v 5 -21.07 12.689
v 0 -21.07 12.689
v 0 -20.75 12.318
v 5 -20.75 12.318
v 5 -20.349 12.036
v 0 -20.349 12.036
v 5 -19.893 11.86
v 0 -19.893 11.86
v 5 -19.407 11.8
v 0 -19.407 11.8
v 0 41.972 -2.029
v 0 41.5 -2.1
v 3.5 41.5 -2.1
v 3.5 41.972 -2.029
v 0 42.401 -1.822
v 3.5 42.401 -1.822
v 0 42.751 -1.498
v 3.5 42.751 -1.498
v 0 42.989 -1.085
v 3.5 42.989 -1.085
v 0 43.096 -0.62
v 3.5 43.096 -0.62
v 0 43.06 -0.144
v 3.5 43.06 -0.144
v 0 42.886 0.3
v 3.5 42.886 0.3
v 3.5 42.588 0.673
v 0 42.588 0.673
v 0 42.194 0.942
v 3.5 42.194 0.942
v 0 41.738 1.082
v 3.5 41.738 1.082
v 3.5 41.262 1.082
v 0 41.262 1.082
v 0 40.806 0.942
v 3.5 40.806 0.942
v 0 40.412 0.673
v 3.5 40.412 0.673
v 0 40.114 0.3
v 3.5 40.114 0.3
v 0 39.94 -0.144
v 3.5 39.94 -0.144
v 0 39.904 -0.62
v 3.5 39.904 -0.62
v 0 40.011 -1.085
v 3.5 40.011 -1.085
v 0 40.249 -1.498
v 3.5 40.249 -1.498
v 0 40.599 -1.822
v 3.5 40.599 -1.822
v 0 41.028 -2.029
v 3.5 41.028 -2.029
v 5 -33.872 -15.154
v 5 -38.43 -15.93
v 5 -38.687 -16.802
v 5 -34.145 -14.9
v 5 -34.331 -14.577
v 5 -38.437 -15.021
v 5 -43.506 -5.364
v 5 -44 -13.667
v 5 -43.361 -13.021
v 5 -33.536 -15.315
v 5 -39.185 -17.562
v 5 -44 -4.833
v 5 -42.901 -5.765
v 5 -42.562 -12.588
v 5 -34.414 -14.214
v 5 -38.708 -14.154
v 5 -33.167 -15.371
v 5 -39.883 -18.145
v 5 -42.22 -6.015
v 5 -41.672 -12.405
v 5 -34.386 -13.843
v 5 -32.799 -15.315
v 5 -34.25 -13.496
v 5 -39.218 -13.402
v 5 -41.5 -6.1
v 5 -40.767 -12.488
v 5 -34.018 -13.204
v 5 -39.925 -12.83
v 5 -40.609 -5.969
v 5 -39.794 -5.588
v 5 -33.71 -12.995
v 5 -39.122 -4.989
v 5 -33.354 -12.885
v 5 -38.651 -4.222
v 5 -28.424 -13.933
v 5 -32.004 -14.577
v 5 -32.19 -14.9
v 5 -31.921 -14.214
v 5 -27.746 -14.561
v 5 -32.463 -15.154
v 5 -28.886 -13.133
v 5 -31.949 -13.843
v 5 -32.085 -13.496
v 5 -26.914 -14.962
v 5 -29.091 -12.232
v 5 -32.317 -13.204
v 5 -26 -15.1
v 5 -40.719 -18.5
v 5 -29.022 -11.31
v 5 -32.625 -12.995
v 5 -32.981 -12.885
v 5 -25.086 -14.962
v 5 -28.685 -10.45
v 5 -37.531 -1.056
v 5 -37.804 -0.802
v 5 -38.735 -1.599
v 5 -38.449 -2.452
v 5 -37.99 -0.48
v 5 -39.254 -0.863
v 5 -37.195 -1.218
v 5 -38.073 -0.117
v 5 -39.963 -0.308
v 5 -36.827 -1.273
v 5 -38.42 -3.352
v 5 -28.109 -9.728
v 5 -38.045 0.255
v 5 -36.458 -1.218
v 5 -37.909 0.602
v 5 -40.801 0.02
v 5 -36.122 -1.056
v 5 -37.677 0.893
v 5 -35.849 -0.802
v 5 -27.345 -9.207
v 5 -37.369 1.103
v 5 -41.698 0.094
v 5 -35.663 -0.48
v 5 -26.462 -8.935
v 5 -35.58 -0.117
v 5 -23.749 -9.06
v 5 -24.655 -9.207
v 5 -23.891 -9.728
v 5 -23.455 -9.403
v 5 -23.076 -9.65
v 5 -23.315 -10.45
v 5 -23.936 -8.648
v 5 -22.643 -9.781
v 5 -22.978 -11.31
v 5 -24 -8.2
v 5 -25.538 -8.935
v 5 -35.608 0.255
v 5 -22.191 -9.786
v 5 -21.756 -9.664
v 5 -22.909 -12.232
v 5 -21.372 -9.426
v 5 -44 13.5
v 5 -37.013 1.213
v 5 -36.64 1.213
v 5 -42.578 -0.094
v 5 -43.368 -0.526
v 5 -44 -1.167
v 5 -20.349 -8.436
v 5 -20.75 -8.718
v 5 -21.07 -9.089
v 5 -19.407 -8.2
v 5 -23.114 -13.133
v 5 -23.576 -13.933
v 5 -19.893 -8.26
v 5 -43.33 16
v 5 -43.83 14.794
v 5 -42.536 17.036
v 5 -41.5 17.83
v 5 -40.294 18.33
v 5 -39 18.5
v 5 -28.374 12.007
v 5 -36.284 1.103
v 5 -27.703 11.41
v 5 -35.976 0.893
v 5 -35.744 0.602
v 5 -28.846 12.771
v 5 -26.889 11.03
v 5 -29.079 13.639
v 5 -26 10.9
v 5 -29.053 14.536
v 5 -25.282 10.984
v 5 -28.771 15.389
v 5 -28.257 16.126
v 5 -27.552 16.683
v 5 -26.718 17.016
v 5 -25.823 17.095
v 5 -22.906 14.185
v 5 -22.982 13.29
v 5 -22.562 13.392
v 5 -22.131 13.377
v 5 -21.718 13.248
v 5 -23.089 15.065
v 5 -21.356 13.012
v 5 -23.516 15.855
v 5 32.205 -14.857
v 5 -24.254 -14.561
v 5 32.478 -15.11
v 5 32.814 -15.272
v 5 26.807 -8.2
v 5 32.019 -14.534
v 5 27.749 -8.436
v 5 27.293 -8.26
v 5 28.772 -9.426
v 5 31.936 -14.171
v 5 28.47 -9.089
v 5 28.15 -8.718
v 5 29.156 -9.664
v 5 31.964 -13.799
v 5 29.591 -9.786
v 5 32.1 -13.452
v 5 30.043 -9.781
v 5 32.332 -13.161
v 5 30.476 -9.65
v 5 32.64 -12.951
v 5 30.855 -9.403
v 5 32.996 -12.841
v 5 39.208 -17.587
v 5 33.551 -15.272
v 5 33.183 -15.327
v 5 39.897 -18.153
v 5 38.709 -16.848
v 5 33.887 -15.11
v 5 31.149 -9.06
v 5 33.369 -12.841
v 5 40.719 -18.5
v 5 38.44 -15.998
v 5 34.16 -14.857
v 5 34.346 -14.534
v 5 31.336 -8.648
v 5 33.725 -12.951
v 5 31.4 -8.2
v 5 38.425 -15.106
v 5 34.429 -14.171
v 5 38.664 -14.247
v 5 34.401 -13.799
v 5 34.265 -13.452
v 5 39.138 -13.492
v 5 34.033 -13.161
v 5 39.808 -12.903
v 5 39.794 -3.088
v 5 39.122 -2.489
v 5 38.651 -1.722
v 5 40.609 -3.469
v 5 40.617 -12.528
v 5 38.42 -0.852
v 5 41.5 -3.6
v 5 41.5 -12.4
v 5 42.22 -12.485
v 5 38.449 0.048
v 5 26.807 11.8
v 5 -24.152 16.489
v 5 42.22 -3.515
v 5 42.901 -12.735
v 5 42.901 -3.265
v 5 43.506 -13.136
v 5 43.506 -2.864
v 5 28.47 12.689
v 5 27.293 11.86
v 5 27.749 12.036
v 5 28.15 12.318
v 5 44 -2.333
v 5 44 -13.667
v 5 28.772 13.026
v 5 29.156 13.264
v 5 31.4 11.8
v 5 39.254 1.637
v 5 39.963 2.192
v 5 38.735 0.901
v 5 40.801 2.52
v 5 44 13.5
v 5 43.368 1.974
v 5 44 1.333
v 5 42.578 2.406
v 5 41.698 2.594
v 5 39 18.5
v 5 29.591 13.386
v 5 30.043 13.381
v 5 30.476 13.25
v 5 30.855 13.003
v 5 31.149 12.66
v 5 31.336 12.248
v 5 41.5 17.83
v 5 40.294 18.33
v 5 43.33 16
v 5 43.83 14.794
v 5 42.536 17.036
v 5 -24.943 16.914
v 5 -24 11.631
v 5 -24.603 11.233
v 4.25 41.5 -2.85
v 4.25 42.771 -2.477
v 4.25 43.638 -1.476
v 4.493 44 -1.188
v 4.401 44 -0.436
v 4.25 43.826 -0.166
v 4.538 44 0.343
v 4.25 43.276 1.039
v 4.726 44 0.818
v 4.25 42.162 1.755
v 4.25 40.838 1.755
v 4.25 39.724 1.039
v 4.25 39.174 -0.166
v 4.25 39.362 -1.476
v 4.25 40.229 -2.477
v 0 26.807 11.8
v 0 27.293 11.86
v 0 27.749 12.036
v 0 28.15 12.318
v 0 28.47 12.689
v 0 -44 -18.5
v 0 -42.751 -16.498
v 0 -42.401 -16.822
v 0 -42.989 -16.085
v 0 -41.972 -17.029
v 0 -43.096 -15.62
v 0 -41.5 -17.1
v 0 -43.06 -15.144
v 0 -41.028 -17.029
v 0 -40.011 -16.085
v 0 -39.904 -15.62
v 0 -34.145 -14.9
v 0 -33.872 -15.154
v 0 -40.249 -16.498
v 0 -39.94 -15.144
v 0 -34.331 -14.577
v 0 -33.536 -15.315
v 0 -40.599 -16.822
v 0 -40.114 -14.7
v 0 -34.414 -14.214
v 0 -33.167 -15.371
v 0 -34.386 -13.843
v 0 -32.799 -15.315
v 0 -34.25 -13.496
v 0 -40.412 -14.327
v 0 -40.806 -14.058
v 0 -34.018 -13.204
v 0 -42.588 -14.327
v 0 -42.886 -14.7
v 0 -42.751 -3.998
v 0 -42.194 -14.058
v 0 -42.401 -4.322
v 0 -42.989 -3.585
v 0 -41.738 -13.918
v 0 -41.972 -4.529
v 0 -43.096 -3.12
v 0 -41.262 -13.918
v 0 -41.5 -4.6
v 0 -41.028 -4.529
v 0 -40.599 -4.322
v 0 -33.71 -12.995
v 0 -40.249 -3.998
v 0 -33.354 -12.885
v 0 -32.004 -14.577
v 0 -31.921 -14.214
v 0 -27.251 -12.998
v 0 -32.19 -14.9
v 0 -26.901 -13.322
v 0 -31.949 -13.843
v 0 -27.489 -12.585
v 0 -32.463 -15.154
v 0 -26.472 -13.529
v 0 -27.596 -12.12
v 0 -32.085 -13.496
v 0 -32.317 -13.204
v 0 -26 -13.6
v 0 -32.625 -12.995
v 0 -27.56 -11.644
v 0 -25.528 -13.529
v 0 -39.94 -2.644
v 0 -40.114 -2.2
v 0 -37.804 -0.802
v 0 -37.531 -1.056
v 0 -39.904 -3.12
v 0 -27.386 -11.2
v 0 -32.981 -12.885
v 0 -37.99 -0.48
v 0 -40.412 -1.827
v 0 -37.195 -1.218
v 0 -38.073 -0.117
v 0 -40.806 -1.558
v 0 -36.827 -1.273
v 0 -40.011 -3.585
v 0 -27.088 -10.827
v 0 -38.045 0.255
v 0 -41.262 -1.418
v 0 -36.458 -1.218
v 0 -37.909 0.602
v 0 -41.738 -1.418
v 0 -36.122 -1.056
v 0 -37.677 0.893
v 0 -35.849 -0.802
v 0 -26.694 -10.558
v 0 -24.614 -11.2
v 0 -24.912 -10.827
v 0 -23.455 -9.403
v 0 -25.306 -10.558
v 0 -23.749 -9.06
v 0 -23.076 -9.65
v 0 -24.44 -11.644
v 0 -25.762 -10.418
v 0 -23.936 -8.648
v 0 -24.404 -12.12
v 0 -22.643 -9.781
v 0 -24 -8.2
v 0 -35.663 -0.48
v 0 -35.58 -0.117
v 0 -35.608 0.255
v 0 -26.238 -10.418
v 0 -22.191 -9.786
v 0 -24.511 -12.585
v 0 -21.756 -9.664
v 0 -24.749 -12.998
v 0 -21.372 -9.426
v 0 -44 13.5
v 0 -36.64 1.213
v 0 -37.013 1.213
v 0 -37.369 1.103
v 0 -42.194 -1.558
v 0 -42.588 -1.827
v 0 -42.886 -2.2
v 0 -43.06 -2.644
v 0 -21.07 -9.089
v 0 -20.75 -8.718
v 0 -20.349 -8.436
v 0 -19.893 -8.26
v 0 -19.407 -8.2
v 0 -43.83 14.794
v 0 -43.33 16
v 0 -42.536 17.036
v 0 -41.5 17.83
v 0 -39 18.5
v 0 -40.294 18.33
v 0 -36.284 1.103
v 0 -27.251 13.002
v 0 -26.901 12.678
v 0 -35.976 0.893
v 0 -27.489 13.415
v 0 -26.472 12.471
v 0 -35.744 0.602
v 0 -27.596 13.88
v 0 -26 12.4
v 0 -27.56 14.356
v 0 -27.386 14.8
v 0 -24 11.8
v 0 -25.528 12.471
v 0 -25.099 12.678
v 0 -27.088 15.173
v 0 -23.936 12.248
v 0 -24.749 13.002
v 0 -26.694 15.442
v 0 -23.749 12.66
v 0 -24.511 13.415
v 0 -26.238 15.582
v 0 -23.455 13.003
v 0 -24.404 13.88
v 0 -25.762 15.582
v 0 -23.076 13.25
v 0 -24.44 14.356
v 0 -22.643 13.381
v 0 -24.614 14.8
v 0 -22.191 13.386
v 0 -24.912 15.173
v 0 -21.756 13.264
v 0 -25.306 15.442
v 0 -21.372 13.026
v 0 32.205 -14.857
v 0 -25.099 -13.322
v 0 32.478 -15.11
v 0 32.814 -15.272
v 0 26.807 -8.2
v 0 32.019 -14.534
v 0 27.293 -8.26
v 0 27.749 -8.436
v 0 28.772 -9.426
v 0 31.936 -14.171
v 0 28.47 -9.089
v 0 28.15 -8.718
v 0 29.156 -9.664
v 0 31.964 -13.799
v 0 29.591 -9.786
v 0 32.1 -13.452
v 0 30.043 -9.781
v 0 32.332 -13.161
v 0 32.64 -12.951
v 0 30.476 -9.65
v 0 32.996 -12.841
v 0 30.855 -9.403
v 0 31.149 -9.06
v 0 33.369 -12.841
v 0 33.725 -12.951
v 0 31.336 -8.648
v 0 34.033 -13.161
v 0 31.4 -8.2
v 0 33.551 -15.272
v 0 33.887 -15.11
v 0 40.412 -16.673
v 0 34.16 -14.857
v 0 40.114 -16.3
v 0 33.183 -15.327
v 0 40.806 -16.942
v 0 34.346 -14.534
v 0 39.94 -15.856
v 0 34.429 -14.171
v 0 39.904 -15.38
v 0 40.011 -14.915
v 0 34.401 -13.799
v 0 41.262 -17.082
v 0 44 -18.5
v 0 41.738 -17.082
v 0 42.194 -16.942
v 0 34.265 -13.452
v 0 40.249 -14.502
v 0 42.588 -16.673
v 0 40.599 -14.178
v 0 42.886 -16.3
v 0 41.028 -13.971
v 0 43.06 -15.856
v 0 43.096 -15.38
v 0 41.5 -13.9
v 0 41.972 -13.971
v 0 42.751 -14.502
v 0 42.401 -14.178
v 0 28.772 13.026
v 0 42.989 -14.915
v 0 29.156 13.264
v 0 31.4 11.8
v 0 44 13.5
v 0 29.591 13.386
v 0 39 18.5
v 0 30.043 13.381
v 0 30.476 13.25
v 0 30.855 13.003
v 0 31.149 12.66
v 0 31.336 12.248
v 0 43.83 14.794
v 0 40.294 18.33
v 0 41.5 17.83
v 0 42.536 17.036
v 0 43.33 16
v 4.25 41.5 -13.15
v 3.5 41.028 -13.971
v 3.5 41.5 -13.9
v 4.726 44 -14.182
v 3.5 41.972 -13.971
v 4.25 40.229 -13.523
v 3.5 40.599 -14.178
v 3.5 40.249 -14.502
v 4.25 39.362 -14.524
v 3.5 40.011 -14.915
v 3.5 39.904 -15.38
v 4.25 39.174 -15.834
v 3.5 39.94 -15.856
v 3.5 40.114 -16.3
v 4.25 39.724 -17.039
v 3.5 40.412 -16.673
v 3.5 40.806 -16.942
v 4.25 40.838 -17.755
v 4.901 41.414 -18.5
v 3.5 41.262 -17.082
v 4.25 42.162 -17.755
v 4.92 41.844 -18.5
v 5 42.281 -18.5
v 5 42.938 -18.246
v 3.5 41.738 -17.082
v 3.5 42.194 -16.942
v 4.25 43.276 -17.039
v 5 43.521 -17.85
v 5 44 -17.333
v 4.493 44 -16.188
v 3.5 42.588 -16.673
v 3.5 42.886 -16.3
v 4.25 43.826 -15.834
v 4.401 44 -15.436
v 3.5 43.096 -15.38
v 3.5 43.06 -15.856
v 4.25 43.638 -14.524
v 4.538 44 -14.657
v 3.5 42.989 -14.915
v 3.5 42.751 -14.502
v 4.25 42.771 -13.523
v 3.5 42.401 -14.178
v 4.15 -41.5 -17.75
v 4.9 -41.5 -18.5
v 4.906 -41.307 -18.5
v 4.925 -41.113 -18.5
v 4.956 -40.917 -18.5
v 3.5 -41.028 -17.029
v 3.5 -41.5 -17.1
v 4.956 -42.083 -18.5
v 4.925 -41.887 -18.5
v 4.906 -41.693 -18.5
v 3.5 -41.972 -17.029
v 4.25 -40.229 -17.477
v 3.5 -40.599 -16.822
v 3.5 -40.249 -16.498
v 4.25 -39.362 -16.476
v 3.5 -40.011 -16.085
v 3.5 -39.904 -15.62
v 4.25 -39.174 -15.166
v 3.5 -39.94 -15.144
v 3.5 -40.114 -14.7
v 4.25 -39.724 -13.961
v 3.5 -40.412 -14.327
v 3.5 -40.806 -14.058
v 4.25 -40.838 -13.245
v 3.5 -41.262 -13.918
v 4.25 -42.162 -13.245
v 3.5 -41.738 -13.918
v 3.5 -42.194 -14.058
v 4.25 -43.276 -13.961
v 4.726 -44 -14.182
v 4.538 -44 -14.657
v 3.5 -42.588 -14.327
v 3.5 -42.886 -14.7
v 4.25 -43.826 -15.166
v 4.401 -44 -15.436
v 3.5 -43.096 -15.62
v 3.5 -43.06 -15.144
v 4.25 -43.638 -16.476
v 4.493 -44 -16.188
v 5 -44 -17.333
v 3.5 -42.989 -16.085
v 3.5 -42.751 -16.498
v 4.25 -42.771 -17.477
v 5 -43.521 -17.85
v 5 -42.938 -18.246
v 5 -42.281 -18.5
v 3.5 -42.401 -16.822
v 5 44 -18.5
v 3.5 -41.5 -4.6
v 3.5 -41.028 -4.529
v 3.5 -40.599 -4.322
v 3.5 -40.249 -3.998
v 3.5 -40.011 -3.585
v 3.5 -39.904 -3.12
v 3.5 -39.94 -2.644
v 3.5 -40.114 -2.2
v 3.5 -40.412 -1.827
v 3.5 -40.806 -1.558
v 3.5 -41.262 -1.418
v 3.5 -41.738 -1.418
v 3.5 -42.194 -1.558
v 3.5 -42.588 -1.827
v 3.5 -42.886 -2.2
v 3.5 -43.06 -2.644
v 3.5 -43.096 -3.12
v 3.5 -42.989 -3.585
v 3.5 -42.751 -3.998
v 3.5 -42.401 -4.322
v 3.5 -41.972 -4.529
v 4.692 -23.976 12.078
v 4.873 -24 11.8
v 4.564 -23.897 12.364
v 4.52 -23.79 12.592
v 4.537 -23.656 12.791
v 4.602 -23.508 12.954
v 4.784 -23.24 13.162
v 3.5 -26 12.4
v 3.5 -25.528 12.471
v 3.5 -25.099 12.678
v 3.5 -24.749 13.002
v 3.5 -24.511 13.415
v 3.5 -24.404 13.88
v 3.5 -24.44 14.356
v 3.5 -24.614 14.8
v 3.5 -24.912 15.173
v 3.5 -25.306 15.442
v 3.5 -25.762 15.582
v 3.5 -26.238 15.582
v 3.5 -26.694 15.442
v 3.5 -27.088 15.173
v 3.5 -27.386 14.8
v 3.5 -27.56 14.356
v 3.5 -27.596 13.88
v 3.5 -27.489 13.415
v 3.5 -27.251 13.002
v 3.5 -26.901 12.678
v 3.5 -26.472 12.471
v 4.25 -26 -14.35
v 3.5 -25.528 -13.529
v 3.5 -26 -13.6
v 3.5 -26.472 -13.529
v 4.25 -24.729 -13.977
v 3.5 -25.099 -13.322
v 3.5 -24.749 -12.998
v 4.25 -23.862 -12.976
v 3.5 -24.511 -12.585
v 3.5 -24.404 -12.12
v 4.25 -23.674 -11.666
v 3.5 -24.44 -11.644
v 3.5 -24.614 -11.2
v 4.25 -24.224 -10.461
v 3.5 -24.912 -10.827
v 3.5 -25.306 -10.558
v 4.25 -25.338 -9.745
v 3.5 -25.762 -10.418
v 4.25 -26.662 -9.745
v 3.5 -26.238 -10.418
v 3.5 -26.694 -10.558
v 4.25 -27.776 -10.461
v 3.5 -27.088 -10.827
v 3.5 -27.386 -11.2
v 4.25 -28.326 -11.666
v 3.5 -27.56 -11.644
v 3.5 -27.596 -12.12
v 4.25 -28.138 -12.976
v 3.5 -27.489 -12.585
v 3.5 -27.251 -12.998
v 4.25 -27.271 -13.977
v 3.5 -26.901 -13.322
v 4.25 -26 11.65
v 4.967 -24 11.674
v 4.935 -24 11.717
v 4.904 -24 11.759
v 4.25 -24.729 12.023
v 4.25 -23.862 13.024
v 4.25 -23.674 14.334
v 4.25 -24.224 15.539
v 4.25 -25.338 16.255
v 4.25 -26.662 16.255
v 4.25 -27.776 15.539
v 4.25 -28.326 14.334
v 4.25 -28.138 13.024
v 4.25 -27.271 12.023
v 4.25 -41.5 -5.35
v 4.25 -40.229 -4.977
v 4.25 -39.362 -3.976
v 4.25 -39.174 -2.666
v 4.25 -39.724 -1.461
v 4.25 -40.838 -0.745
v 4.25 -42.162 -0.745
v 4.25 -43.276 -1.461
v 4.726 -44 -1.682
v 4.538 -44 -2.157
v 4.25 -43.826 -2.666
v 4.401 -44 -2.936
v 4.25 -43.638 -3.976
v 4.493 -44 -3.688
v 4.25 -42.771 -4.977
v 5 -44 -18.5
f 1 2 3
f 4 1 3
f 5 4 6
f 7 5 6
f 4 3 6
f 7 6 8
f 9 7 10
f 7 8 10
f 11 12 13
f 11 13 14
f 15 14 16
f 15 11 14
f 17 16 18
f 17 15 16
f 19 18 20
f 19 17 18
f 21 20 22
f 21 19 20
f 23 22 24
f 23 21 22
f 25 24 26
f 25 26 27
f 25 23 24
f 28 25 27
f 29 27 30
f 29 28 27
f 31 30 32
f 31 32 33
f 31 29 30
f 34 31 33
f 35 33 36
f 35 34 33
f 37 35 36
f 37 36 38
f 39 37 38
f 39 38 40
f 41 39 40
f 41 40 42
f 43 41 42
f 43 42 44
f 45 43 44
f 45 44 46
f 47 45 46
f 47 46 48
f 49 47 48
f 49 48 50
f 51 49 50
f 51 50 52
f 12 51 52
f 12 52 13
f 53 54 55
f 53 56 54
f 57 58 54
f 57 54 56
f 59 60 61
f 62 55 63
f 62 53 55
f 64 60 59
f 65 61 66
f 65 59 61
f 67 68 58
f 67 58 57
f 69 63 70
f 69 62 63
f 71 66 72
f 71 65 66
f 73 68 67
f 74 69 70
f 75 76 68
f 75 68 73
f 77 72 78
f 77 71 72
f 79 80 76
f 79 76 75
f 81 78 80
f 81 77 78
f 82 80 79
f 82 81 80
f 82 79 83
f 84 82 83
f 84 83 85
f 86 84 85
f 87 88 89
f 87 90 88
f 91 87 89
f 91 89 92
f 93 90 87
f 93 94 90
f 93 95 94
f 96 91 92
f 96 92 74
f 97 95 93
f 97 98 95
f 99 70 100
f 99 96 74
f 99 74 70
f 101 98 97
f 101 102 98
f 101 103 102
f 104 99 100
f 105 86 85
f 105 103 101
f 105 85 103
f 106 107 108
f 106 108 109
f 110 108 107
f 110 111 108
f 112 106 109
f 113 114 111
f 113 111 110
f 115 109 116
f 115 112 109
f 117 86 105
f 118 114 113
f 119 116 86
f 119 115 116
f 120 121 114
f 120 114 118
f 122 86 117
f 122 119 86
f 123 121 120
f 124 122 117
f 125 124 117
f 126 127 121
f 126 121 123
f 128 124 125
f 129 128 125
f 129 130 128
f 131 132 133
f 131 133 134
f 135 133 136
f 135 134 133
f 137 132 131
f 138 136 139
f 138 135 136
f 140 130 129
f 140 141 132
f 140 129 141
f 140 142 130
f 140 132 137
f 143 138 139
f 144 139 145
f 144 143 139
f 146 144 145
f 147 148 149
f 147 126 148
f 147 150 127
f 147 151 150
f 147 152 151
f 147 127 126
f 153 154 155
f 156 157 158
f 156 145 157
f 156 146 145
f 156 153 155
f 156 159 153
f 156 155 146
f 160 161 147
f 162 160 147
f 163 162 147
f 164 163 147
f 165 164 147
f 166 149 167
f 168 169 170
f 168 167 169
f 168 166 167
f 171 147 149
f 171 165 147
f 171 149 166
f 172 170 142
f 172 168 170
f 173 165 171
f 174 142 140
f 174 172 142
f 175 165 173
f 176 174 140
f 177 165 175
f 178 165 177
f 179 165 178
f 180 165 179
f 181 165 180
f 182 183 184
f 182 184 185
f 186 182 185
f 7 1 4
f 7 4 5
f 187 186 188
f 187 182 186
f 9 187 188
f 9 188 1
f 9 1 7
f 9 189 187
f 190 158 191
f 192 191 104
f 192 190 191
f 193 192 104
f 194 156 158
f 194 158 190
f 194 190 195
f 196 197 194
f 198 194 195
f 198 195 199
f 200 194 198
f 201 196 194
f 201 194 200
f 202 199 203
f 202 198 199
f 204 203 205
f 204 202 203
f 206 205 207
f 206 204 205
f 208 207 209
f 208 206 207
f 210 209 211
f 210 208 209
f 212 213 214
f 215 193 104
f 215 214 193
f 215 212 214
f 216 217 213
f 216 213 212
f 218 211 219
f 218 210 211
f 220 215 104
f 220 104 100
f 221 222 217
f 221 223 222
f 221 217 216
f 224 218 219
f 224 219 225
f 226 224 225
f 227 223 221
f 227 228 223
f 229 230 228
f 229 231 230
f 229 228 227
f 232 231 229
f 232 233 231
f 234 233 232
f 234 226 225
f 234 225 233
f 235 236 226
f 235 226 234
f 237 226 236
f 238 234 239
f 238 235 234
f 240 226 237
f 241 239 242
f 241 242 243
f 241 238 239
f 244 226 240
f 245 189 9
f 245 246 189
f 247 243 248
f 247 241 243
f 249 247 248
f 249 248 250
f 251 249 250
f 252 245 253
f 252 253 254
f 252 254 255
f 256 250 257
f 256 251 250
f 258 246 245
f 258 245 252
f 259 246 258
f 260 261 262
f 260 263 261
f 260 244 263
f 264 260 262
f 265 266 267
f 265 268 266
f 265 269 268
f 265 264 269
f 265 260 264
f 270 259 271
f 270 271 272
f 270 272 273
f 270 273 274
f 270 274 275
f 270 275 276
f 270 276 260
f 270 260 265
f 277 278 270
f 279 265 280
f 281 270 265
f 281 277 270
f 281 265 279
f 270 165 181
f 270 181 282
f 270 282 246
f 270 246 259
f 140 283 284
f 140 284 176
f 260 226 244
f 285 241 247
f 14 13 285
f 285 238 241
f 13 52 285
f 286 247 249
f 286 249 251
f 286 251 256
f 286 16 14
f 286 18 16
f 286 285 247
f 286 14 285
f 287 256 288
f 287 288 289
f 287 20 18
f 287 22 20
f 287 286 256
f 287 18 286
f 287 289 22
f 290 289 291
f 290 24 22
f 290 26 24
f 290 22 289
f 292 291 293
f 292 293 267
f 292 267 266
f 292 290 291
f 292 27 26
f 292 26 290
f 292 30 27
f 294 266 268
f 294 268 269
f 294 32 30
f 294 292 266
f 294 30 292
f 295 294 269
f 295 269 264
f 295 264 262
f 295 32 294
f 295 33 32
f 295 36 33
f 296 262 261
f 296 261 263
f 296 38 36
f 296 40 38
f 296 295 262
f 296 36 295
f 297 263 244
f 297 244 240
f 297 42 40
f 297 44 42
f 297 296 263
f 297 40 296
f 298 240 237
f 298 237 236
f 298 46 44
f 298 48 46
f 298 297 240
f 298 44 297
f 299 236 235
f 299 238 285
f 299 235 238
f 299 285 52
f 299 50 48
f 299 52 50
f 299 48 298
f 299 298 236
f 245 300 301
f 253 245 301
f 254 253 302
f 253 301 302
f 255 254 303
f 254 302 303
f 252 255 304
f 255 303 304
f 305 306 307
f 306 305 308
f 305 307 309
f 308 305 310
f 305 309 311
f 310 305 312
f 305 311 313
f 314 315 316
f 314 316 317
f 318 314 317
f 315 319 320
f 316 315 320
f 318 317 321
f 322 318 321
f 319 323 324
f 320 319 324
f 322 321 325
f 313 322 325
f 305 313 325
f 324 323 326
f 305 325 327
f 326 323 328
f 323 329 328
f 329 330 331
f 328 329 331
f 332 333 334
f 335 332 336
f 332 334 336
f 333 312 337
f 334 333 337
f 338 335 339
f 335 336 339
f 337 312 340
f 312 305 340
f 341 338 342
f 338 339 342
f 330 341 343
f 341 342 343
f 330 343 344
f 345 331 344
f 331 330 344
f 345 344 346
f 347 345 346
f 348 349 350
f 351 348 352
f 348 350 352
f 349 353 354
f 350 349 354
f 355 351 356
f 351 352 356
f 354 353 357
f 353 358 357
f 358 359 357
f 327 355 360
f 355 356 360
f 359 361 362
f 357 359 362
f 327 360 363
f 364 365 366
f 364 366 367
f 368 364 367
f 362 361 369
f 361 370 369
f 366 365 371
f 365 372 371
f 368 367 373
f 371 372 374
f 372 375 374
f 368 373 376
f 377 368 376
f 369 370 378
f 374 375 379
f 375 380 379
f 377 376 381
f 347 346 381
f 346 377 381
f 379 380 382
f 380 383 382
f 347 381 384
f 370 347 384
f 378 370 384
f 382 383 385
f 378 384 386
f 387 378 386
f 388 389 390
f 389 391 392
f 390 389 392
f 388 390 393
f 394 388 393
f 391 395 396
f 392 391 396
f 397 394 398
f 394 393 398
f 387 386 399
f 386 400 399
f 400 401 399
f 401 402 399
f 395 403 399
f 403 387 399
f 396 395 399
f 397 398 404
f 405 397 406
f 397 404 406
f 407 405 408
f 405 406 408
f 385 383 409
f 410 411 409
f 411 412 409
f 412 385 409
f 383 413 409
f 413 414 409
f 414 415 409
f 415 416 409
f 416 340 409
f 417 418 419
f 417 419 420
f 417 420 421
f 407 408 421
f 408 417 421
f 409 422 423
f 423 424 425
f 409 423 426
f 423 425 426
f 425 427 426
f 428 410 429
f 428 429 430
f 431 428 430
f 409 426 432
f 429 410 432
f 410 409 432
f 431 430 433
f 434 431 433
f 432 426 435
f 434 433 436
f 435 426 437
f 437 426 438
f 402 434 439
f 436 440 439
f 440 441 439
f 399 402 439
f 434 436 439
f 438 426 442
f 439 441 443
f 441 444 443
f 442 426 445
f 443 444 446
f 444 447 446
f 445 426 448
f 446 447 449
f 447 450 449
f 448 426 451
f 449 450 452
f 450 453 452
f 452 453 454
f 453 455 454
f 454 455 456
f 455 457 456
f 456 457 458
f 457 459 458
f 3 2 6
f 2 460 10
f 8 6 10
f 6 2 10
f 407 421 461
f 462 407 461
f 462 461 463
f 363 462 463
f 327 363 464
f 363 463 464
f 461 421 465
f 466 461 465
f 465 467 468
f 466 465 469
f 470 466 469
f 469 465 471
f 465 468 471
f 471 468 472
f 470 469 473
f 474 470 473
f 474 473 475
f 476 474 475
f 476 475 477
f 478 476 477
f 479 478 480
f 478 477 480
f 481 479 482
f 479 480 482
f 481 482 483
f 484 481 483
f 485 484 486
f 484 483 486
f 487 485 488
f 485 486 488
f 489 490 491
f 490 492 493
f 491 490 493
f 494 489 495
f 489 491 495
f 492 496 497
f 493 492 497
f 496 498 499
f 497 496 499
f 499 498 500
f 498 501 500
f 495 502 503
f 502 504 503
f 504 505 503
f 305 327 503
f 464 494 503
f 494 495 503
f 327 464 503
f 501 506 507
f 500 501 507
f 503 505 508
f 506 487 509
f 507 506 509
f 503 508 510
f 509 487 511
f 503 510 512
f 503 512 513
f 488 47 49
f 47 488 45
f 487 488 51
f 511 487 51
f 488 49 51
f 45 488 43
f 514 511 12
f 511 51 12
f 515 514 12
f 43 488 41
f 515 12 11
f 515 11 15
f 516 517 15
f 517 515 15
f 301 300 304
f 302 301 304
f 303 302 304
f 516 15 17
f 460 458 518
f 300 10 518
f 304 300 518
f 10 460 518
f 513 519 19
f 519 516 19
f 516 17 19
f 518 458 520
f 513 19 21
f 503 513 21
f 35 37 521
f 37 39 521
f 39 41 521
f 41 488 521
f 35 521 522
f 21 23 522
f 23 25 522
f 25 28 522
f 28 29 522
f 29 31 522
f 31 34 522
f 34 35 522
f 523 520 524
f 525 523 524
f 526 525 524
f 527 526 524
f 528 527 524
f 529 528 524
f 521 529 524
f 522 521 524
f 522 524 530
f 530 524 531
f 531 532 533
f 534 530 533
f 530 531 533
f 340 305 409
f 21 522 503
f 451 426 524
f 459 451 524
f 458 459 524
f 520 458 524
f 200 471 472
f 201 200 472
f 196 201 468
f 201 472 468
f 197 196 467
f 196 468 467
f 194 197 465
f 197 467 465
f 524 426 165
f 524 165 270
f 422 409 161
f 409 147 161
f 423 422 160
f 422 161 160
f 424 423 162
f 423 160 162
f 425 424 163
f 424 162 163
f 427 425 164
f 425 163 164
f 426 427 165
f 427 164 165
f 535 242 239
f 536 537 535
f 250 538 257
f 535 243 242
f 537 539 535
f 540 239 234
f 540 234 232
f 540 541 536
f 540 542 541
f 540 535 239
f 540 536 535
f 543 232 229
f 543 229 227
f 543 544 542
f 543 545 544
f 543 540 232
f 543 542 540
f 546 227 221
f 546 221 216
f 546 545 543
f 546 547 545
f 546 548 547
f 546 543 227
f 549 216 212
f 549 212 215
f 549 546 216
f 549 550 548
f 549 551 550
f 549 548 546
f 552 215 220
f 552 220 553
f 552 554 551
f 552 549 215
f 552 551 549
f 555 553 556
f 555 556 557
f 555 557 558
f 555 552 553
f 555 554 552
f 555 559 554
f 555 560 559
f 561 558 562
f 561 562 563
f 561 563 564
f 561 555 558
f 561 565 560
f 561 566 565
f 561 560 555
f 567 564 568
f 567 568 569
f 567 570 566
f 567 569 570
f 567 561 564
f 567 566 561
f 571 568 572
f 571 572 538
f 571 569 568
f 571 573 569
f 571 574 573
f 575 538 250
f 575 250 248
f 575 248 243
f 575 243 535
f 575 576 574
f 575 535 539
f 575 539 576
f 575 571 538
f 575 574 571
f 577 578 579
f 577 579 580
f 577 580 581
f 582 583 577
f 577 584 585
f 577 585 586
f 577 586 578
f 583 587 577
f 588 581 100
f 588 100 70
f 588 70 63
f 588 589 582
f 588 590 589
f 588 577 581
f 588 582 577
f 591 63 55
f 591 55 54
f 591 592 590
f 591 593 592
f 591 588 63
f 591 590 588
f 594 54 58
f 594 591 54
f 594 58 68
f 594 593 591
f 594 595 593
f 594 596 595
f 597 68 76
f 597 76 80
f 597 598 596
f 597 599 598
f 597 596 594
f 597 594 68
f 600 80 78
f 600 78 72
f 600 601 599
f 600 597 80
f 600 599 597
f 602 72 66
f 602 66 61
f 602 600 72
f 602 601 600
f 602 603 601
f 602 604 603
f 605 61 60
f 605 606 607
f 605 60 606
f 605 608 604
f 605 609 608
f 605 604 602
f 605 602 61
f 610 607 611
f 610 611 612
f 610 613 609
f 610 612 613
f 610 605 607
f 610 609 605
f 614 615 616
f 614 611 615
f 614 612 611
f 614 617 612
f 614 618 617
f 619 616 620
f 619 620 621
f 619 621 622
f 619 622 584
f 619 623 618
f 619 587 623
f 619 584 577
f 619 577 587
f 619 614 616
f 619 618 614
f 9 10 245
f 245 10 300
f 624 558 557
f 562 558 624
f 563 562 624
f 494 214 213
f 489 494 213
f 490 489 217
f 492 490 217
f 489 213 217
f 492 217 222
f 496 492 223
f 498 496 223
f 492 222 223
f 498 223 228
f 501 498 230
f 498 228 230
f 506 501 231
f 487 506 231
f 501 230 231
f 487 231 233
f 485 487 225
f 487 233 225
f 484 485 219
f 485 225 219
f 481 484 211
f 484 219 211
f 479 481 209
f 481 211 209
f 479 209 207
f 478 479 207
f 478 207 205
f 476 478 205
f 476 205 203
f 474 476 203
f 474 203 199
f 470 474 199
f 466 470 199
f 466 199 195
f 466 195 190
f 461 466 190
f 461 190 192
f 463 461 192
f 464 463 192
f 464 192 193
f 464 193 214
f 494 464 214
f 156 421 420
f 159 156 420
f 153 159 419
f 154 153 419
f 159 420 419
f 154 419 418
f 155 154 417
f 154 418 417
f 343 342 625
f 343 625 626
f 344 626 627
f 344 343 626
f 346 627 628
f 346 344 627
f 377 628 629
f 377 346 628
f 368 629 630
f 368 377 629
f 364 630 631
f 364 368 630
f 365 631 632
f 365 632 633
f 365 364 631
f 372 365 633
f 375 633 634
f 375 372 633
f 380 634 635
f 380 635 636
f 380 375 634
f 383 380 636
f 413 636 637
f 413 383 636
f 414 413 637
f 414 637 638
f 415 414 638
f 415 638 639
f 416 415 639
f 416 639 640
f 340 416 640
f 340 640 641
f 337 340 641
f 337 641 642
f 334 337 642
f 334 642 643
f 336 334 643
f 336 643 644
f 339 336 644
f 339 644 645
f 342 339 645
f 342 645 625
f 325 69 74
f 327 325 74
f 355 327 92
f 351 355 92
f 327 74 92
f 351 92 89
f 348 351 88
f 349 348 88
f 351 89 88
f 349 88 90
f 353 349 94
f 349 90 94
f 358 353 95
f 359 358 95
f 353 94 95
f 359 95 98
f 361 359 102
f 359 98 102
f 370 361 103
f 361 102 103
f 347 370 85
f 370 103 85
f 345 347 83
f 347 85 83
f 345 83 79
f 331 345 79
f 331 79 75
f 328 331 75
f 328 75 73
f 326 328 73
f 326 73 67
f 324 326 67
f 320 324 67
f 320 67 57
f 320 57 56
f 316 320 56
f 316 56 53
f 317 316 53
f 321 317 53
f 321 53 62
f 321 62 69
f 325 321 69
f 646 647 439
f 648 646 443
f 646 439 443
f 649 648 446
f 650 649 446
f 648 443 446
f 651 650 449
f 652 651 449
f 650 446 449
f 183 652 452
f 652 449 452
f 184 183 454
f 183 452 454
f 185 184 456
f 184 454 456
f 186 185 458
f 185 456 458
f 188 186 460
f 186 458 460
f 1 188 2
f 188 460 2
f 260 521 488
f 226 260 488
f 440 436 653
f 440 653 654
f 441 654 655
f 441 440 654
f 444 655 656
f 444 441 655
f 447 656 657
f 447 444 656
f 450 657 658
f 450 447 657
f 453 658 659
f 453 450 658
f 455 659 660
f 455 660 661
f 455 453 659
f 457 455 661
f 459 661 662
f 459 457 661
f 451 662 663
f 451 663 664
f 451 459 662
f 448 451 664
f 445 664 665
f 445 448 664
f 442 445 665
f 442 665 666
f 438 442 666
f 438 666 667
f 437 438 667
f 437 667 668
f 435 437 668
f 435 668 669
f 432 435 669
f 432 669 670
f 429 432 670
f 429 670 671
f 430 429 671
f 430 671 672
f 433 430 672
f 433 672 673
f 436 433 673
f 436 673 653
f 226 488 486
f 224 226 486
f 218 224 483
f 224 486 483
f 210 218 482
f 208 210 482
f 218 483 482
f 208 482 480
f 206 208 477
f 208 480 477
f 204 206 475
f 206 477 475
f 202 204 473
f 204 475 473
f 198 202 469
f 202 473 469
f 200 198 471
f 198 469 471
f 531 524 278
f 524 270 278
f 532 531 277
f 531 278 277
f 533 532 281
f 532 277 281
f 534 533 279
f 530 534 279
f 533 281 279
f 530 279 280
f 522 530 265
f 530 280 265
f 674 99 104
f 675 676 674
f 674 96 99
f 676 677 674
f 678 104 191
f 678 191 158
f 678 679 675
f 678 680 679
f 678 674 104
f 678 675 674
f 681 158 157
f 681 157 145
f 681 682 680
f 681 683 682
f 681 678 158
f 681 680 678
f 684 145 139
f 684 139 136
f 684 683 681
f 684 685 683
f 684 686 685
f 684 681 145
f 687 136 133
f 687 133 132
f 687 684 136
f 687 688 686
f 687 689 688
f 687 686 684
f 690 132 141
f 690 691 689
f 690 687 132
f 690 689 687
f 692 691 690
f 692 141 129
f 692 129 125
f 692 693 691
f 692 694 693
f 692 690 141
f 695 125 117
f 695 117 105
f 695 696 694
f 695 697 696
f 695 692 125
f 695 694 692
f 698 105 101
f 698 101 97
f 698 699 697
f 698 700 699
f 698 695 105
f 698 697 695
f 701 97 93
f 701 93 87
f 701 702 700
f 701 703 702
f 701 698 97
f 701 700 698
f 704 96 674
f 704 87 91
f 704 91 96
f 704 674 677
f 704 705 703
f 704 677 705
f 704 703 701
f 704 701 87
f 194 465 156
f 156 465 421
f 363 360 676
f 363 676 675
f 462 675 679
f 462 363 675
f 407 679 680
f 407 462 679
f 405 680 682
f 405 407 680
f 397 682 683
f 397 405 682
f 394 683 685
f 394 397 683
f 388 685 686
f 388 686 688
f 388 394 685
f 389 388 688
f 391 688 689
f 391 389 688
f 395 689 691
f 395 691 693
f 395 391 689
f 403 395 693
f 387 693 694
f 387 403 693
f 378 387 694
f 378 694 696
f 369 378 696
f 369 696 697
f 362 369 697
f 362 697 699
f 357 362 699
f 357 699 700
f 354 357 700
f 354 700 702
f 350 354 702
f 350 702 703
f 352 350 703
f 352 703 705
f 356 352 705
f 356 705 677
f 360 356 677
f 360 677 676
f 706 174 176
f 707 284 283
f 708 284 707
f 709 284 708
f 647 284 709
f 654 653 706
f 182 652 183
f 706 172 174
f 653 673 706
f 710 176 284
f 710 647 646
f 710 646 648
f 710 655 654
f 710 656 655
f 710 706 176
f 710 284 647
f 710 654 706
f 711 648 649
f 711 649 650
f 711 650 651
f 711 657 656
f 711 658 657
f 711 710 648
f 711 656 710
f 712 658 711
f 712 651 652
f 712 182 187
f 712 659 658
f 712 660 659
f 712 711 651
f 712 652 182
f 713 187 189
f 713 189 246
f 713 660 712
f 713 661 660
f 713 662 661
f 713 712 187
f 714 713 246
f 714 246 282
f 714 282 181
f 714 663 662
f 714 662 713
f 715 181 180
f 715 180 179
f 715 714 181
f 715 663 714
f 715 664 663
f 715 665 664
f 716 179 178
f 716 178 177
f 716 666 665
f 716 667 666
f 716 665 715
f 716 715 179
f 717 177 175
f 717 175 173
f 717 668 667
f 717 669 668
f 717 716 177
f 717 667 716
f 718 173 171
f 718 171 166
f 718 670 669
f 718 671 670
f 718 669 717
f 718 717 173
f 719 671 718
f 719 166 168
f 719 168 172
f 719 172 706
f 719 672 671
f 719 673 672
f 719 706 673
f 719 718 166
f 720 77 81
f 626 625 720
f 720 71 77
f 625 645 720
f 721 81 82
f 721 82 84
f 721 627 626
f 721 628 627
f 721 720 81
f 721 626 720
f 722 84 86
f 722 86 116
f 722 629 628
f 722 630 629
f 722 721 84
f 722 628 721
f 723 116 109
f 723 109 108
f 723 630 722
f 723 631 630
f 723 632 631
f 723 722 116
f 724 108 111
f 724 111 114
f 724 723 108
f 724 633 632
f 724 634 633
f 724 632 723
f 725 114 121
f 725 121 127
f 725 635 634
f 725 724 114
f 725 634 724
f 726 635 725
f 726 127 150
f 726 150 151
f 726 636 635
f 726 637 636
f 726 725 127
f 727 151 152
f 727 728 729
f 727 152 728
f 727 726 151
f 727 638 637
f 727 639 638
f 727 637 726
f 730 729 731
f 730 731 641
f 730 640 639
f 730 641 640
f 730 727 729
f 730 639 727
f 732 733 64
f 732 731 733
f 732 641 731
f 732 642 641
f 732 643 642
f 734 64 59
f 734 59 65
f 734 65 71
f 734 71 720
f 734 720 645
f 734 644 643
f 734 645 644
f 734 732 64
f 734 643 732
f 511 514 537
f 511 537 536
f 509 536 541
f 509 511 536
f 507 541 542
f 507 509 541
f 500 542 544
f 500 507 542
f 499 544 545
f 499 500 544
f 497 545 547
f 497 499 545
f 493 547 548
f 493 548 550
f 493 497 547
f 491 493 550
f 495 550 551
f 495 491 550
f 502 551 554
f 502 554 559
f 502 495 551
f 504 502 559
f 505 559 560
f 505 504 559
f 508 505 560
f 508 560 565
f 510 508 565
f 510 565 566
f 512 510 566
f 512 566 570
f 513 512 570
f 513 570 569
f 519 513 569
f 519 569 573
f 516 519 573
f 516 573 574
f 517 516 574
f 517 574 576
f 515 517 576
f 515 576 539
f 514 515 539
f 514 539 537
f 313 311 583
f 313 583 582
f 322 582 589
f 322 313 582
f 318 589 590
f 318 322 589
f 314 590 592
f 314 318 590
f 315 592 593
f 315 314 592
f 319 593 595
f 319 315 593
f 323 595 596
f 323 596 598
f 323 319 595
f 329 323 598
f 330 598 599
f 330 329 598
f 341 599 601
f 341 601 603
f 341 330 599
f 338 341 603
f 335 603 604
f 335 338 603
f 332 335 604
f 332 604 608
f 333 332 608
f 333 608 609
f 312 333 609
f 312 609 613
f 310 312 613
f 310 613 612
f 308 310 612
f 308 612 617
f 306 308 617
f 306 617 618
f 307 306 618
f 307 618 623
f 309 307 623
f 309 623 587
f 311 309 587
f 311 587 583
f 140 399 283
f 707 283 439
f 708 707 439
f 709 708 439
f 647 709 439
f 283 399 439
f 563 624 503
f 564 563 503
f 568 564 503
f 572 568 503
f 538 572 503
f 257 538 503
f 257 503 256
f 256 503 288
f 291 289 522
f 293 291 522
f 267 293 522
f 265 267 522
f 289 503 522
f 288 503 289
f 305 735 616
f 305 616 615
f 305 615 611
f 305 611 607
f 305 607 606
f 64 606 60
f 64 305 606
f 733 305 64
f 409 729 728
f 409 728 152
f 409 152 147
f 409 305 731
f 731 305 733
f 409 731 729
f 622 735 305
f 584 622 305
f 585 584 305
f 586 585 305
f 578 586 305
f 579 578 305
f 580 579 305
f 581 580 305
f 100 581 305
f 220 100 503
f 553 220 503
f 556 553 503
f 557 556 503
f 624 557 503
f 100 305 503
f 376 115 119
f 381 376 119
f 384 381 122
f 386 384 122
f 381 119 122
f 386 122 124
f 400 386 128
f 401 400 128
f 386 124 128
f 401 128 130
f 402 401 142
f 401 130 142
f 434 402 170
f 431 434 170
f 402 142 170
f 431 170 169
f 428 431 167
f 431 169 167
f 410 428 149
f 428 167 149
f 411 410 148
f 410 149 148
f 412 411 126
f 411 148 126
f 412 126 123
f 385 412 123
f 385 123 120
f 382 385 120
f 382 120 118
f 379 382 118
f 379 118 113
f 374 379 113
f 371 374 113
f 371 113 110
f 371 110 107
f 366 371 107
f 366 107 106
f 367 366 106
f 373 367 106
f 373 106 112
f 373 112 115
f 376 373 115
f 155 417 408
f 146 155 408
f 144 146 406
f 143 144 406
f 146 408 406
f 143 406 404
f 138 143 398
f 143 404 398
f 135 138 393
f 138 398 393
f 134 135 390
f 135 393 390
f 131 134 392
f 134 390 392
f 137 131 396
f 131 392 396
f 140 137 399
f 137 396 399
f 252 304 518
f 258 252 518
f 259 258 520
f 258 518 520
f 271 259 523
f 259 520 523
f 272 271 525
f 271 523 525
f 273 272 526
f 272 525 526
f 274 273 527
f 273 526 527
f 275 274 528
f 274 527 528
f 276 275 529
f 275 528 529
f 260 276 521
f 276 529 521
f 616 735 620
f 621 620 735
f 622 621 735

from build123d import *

# Parameters (mm, degrees)
SKETCH1_W           = 88
SKETCH1_H           = 37
SKETCH1_R           = 1.6
BOSS_EXTRUDE1_DEPTH = 5
FILLET1_R           = 5
CHAMFER2_SIZE       = 1.5
SKETCH2_R           = 1.25
CUT_EXTRUDE1_DEPTH  = 10


with BuildPart() as part:
    # Sketch1 → Boss-Extrude1 (new body)
    with BuildSketch(Plane.YZ):
        Rectangle(SKETCH1_W, SKETCH1_H)
        with Locations(Location((-41.5, -15.5, 0), (0, 0, 270))):
            Circle(SKETCH1_R, mode=Mode.SUBTRACT)
        with Locations(Location((-41.5, -3, 0), (0, 0, 270))):
            Circle(SKETCH1_R, mode=Mode.SUBTRACT)
        with Locations(Location((41.5, -15.5, 0), (0, 0, 90))):
            Circle(SKETCH1_R, mode=Mode.SUBTRACT)
        with Locations(Location((-26, 14, 0), (0, 0, 270))):
            Circle(SKETCH1_R, mode=Mode.SUBTRACT)
        with Locations(Location((-26, -12, 0), (0, 0, 270))):
            Circle(SKETCH1_R, mode=Mode.SUBTRACT)
        with Locations(Location((41.5, -0.5, 0), (0, 0, 270))):
            Circle(SKETCH1_R, mode=Mode.SUBTRACT)
        with BuildLine():
            Line((-24, -8.2), (-24, 11.8))
            ThreePointArc((-24, 11.8), (-22.86444197, 13.331108636), (-21.069632929, 12.688888889))
            ThreePointArc((-21.069632929, 12.688888889), (-20.349483132, 12.036165793), (-19.406674091, 11.8))
            Line((-19.406674091, 11.8), (26.806674091, 11.8))
            ThreePointArc((26.806674091, 11.8), (27.749483132, 12.036165793), (28.469632929, 12.688888889))
            ThreePointArc((28.469632929, 12.688888889), (30.26444197, 13.331108636), (31.4, 11.8))
            Line((31.4, 11.8), (31.4, -8.2))
            ThreePointArc((31.4, -8.2), (30.26444197, -9.731108636), (28.469632929, -9.088888889))
            ThreePointArc((28.469632929, -9.088888889), (27.749483132, -8.436165793), (26.806674091, -8.2))
            Line((26.806674091, -8.2), (-19.406674091, -8.2))
            ThreePointArc((-19.406674091, -8.2), (-20.349483132, -8.436165793), (-21.069632929, -9.088888889))
            ThreePointArc((-21.069632929, -9.088888889), (-22.86444197, -9.731108636), (-24, -8.2))
        make_face(mode=Mode.SUBTRACT)
    extrude(amount=BOSS_EXTRUDE1_DEPTH)

    # Fillet1
    fillet1_edges = [part.edges().sort_by_distance(p)[0] for p in [
        (2.5, -44, 18.5),
        (2.5, 44, 18.5),
    ]]
    fillet(fillet1_edges, radius=FILLET1_R)

    # Chamfer2
    # the kernel refuses this chamfer: 1.5 mm, written as the material it takes off along each edge
    with BuildSketch(Plane(origin=(5, -41.5, -15.5), x_dir=(0, 0, -1), z_dir=(0, -1, 0))) as chamfer2_piece_1:
        Polygon((1.6 + CHAMFER2_SIZE, 0), (1.6, -CHAMFER2_SIZE), (1.6, 0), align=None)
    revolve(axis=Axis((5, -41.5, -15.5), (1, 0, 0)), mode=Mode.SUBTRACT)
    with BuildSketch(Plane(origin=(5, -41.5, -3), x_dir=(0, 0, -1), z_dir=(0, -1, 0))) as chamfer2_piece_2:
        Polygon((1.6 + CHAMFER2_SIZE, 0), (1.6, -CHAMFER2_SIZE), (1.6, 0), align=None)
    revolve(axis=Axis((5, -41.5, -3), (1, 0, 0)), mode=Mode.SUBTRACT)
    with BuildSketch(Plane(origin=(5, 41.5, -0.5), x_dir=(0, 0, -1), z_dir=(0, -1, 0))) as chamfer2_piece_3:
        Polygon((1.6 + CHAMFER2_SIZE, 0), (1.6, -CHAMFER2_SIZE), (1.6, 0), align=None)
    revolve(axis=Axis((5, 41.5, -0.5), (1, 0, 0)), mode=Mode.SUBTRACT)
    with BuildSketch(Plane(origin=(5, 41.5, -15.5), x_dir=(0, 0, 1), z_dir=(0, 1, 0))) as chamfer2_piece_4:
        Polygon((1.6 + CHAMFER2_SIZE, 0), (1.6, -CHAMFER2_SIZE), (1.6, 0), align=None)
    revolve(axis=Axis((5, 41.5, -15.5), (1, 0, 0)), mode=Mode.SUBTRACT)
    with BuildSketch(Plane(origin=(5, -26, 14), x_dir=(0, 0, -1), z_dir=(0, -1, 0))) as chamfer2_piece_5:
        Polygon((1.6 + CHAMFER2_SIZE, 0), (1.6, -CHAMFER2_SIZE), (1.6, 0), align=None)
    revolve(axis=Axis((5, -26, 14), (1, 0, 0)), mode=Mode.SUBTRACT)
    with BuildSketch(Plane(origin=(5, -26, -12), x_dir=(0, 0, -1), z_dir=(0, -1, 0))) as chamfer2_piece_6:
        Polygon((1.6 + CHAMFER2_SIZE, 0), (1.6, -CHAMFER2_SIZE), (1.6, 0), align=None)
    revolve(axis=Axis((5, -26, -12), (1, 0, 0)), mode=Mode.SUBTRACT)

    # Sketch2 → Cut-Extrude1 (cut)
    with BuildSketch(Plane.YZ.offset(5)):
        with Locations(Location((-36.826603685, -0.023130638, 0), (0, 0, 270))):
            Circle(SKETCH2_R)
        with Locations(Location((-33.167413509, -14.120748425, 0), (0, 0, 270))):
            Circle(SKETCH2_R)
        with Locations(Location((33.182572395, -14.077498807, 0), (0, 0, 270))):
            Circle(SKETCH2_R)
    extrude(amount=-CUT_EXTRUDE1_DEPTH, mode=Mode.SUBTRACT)


solid = part.part
